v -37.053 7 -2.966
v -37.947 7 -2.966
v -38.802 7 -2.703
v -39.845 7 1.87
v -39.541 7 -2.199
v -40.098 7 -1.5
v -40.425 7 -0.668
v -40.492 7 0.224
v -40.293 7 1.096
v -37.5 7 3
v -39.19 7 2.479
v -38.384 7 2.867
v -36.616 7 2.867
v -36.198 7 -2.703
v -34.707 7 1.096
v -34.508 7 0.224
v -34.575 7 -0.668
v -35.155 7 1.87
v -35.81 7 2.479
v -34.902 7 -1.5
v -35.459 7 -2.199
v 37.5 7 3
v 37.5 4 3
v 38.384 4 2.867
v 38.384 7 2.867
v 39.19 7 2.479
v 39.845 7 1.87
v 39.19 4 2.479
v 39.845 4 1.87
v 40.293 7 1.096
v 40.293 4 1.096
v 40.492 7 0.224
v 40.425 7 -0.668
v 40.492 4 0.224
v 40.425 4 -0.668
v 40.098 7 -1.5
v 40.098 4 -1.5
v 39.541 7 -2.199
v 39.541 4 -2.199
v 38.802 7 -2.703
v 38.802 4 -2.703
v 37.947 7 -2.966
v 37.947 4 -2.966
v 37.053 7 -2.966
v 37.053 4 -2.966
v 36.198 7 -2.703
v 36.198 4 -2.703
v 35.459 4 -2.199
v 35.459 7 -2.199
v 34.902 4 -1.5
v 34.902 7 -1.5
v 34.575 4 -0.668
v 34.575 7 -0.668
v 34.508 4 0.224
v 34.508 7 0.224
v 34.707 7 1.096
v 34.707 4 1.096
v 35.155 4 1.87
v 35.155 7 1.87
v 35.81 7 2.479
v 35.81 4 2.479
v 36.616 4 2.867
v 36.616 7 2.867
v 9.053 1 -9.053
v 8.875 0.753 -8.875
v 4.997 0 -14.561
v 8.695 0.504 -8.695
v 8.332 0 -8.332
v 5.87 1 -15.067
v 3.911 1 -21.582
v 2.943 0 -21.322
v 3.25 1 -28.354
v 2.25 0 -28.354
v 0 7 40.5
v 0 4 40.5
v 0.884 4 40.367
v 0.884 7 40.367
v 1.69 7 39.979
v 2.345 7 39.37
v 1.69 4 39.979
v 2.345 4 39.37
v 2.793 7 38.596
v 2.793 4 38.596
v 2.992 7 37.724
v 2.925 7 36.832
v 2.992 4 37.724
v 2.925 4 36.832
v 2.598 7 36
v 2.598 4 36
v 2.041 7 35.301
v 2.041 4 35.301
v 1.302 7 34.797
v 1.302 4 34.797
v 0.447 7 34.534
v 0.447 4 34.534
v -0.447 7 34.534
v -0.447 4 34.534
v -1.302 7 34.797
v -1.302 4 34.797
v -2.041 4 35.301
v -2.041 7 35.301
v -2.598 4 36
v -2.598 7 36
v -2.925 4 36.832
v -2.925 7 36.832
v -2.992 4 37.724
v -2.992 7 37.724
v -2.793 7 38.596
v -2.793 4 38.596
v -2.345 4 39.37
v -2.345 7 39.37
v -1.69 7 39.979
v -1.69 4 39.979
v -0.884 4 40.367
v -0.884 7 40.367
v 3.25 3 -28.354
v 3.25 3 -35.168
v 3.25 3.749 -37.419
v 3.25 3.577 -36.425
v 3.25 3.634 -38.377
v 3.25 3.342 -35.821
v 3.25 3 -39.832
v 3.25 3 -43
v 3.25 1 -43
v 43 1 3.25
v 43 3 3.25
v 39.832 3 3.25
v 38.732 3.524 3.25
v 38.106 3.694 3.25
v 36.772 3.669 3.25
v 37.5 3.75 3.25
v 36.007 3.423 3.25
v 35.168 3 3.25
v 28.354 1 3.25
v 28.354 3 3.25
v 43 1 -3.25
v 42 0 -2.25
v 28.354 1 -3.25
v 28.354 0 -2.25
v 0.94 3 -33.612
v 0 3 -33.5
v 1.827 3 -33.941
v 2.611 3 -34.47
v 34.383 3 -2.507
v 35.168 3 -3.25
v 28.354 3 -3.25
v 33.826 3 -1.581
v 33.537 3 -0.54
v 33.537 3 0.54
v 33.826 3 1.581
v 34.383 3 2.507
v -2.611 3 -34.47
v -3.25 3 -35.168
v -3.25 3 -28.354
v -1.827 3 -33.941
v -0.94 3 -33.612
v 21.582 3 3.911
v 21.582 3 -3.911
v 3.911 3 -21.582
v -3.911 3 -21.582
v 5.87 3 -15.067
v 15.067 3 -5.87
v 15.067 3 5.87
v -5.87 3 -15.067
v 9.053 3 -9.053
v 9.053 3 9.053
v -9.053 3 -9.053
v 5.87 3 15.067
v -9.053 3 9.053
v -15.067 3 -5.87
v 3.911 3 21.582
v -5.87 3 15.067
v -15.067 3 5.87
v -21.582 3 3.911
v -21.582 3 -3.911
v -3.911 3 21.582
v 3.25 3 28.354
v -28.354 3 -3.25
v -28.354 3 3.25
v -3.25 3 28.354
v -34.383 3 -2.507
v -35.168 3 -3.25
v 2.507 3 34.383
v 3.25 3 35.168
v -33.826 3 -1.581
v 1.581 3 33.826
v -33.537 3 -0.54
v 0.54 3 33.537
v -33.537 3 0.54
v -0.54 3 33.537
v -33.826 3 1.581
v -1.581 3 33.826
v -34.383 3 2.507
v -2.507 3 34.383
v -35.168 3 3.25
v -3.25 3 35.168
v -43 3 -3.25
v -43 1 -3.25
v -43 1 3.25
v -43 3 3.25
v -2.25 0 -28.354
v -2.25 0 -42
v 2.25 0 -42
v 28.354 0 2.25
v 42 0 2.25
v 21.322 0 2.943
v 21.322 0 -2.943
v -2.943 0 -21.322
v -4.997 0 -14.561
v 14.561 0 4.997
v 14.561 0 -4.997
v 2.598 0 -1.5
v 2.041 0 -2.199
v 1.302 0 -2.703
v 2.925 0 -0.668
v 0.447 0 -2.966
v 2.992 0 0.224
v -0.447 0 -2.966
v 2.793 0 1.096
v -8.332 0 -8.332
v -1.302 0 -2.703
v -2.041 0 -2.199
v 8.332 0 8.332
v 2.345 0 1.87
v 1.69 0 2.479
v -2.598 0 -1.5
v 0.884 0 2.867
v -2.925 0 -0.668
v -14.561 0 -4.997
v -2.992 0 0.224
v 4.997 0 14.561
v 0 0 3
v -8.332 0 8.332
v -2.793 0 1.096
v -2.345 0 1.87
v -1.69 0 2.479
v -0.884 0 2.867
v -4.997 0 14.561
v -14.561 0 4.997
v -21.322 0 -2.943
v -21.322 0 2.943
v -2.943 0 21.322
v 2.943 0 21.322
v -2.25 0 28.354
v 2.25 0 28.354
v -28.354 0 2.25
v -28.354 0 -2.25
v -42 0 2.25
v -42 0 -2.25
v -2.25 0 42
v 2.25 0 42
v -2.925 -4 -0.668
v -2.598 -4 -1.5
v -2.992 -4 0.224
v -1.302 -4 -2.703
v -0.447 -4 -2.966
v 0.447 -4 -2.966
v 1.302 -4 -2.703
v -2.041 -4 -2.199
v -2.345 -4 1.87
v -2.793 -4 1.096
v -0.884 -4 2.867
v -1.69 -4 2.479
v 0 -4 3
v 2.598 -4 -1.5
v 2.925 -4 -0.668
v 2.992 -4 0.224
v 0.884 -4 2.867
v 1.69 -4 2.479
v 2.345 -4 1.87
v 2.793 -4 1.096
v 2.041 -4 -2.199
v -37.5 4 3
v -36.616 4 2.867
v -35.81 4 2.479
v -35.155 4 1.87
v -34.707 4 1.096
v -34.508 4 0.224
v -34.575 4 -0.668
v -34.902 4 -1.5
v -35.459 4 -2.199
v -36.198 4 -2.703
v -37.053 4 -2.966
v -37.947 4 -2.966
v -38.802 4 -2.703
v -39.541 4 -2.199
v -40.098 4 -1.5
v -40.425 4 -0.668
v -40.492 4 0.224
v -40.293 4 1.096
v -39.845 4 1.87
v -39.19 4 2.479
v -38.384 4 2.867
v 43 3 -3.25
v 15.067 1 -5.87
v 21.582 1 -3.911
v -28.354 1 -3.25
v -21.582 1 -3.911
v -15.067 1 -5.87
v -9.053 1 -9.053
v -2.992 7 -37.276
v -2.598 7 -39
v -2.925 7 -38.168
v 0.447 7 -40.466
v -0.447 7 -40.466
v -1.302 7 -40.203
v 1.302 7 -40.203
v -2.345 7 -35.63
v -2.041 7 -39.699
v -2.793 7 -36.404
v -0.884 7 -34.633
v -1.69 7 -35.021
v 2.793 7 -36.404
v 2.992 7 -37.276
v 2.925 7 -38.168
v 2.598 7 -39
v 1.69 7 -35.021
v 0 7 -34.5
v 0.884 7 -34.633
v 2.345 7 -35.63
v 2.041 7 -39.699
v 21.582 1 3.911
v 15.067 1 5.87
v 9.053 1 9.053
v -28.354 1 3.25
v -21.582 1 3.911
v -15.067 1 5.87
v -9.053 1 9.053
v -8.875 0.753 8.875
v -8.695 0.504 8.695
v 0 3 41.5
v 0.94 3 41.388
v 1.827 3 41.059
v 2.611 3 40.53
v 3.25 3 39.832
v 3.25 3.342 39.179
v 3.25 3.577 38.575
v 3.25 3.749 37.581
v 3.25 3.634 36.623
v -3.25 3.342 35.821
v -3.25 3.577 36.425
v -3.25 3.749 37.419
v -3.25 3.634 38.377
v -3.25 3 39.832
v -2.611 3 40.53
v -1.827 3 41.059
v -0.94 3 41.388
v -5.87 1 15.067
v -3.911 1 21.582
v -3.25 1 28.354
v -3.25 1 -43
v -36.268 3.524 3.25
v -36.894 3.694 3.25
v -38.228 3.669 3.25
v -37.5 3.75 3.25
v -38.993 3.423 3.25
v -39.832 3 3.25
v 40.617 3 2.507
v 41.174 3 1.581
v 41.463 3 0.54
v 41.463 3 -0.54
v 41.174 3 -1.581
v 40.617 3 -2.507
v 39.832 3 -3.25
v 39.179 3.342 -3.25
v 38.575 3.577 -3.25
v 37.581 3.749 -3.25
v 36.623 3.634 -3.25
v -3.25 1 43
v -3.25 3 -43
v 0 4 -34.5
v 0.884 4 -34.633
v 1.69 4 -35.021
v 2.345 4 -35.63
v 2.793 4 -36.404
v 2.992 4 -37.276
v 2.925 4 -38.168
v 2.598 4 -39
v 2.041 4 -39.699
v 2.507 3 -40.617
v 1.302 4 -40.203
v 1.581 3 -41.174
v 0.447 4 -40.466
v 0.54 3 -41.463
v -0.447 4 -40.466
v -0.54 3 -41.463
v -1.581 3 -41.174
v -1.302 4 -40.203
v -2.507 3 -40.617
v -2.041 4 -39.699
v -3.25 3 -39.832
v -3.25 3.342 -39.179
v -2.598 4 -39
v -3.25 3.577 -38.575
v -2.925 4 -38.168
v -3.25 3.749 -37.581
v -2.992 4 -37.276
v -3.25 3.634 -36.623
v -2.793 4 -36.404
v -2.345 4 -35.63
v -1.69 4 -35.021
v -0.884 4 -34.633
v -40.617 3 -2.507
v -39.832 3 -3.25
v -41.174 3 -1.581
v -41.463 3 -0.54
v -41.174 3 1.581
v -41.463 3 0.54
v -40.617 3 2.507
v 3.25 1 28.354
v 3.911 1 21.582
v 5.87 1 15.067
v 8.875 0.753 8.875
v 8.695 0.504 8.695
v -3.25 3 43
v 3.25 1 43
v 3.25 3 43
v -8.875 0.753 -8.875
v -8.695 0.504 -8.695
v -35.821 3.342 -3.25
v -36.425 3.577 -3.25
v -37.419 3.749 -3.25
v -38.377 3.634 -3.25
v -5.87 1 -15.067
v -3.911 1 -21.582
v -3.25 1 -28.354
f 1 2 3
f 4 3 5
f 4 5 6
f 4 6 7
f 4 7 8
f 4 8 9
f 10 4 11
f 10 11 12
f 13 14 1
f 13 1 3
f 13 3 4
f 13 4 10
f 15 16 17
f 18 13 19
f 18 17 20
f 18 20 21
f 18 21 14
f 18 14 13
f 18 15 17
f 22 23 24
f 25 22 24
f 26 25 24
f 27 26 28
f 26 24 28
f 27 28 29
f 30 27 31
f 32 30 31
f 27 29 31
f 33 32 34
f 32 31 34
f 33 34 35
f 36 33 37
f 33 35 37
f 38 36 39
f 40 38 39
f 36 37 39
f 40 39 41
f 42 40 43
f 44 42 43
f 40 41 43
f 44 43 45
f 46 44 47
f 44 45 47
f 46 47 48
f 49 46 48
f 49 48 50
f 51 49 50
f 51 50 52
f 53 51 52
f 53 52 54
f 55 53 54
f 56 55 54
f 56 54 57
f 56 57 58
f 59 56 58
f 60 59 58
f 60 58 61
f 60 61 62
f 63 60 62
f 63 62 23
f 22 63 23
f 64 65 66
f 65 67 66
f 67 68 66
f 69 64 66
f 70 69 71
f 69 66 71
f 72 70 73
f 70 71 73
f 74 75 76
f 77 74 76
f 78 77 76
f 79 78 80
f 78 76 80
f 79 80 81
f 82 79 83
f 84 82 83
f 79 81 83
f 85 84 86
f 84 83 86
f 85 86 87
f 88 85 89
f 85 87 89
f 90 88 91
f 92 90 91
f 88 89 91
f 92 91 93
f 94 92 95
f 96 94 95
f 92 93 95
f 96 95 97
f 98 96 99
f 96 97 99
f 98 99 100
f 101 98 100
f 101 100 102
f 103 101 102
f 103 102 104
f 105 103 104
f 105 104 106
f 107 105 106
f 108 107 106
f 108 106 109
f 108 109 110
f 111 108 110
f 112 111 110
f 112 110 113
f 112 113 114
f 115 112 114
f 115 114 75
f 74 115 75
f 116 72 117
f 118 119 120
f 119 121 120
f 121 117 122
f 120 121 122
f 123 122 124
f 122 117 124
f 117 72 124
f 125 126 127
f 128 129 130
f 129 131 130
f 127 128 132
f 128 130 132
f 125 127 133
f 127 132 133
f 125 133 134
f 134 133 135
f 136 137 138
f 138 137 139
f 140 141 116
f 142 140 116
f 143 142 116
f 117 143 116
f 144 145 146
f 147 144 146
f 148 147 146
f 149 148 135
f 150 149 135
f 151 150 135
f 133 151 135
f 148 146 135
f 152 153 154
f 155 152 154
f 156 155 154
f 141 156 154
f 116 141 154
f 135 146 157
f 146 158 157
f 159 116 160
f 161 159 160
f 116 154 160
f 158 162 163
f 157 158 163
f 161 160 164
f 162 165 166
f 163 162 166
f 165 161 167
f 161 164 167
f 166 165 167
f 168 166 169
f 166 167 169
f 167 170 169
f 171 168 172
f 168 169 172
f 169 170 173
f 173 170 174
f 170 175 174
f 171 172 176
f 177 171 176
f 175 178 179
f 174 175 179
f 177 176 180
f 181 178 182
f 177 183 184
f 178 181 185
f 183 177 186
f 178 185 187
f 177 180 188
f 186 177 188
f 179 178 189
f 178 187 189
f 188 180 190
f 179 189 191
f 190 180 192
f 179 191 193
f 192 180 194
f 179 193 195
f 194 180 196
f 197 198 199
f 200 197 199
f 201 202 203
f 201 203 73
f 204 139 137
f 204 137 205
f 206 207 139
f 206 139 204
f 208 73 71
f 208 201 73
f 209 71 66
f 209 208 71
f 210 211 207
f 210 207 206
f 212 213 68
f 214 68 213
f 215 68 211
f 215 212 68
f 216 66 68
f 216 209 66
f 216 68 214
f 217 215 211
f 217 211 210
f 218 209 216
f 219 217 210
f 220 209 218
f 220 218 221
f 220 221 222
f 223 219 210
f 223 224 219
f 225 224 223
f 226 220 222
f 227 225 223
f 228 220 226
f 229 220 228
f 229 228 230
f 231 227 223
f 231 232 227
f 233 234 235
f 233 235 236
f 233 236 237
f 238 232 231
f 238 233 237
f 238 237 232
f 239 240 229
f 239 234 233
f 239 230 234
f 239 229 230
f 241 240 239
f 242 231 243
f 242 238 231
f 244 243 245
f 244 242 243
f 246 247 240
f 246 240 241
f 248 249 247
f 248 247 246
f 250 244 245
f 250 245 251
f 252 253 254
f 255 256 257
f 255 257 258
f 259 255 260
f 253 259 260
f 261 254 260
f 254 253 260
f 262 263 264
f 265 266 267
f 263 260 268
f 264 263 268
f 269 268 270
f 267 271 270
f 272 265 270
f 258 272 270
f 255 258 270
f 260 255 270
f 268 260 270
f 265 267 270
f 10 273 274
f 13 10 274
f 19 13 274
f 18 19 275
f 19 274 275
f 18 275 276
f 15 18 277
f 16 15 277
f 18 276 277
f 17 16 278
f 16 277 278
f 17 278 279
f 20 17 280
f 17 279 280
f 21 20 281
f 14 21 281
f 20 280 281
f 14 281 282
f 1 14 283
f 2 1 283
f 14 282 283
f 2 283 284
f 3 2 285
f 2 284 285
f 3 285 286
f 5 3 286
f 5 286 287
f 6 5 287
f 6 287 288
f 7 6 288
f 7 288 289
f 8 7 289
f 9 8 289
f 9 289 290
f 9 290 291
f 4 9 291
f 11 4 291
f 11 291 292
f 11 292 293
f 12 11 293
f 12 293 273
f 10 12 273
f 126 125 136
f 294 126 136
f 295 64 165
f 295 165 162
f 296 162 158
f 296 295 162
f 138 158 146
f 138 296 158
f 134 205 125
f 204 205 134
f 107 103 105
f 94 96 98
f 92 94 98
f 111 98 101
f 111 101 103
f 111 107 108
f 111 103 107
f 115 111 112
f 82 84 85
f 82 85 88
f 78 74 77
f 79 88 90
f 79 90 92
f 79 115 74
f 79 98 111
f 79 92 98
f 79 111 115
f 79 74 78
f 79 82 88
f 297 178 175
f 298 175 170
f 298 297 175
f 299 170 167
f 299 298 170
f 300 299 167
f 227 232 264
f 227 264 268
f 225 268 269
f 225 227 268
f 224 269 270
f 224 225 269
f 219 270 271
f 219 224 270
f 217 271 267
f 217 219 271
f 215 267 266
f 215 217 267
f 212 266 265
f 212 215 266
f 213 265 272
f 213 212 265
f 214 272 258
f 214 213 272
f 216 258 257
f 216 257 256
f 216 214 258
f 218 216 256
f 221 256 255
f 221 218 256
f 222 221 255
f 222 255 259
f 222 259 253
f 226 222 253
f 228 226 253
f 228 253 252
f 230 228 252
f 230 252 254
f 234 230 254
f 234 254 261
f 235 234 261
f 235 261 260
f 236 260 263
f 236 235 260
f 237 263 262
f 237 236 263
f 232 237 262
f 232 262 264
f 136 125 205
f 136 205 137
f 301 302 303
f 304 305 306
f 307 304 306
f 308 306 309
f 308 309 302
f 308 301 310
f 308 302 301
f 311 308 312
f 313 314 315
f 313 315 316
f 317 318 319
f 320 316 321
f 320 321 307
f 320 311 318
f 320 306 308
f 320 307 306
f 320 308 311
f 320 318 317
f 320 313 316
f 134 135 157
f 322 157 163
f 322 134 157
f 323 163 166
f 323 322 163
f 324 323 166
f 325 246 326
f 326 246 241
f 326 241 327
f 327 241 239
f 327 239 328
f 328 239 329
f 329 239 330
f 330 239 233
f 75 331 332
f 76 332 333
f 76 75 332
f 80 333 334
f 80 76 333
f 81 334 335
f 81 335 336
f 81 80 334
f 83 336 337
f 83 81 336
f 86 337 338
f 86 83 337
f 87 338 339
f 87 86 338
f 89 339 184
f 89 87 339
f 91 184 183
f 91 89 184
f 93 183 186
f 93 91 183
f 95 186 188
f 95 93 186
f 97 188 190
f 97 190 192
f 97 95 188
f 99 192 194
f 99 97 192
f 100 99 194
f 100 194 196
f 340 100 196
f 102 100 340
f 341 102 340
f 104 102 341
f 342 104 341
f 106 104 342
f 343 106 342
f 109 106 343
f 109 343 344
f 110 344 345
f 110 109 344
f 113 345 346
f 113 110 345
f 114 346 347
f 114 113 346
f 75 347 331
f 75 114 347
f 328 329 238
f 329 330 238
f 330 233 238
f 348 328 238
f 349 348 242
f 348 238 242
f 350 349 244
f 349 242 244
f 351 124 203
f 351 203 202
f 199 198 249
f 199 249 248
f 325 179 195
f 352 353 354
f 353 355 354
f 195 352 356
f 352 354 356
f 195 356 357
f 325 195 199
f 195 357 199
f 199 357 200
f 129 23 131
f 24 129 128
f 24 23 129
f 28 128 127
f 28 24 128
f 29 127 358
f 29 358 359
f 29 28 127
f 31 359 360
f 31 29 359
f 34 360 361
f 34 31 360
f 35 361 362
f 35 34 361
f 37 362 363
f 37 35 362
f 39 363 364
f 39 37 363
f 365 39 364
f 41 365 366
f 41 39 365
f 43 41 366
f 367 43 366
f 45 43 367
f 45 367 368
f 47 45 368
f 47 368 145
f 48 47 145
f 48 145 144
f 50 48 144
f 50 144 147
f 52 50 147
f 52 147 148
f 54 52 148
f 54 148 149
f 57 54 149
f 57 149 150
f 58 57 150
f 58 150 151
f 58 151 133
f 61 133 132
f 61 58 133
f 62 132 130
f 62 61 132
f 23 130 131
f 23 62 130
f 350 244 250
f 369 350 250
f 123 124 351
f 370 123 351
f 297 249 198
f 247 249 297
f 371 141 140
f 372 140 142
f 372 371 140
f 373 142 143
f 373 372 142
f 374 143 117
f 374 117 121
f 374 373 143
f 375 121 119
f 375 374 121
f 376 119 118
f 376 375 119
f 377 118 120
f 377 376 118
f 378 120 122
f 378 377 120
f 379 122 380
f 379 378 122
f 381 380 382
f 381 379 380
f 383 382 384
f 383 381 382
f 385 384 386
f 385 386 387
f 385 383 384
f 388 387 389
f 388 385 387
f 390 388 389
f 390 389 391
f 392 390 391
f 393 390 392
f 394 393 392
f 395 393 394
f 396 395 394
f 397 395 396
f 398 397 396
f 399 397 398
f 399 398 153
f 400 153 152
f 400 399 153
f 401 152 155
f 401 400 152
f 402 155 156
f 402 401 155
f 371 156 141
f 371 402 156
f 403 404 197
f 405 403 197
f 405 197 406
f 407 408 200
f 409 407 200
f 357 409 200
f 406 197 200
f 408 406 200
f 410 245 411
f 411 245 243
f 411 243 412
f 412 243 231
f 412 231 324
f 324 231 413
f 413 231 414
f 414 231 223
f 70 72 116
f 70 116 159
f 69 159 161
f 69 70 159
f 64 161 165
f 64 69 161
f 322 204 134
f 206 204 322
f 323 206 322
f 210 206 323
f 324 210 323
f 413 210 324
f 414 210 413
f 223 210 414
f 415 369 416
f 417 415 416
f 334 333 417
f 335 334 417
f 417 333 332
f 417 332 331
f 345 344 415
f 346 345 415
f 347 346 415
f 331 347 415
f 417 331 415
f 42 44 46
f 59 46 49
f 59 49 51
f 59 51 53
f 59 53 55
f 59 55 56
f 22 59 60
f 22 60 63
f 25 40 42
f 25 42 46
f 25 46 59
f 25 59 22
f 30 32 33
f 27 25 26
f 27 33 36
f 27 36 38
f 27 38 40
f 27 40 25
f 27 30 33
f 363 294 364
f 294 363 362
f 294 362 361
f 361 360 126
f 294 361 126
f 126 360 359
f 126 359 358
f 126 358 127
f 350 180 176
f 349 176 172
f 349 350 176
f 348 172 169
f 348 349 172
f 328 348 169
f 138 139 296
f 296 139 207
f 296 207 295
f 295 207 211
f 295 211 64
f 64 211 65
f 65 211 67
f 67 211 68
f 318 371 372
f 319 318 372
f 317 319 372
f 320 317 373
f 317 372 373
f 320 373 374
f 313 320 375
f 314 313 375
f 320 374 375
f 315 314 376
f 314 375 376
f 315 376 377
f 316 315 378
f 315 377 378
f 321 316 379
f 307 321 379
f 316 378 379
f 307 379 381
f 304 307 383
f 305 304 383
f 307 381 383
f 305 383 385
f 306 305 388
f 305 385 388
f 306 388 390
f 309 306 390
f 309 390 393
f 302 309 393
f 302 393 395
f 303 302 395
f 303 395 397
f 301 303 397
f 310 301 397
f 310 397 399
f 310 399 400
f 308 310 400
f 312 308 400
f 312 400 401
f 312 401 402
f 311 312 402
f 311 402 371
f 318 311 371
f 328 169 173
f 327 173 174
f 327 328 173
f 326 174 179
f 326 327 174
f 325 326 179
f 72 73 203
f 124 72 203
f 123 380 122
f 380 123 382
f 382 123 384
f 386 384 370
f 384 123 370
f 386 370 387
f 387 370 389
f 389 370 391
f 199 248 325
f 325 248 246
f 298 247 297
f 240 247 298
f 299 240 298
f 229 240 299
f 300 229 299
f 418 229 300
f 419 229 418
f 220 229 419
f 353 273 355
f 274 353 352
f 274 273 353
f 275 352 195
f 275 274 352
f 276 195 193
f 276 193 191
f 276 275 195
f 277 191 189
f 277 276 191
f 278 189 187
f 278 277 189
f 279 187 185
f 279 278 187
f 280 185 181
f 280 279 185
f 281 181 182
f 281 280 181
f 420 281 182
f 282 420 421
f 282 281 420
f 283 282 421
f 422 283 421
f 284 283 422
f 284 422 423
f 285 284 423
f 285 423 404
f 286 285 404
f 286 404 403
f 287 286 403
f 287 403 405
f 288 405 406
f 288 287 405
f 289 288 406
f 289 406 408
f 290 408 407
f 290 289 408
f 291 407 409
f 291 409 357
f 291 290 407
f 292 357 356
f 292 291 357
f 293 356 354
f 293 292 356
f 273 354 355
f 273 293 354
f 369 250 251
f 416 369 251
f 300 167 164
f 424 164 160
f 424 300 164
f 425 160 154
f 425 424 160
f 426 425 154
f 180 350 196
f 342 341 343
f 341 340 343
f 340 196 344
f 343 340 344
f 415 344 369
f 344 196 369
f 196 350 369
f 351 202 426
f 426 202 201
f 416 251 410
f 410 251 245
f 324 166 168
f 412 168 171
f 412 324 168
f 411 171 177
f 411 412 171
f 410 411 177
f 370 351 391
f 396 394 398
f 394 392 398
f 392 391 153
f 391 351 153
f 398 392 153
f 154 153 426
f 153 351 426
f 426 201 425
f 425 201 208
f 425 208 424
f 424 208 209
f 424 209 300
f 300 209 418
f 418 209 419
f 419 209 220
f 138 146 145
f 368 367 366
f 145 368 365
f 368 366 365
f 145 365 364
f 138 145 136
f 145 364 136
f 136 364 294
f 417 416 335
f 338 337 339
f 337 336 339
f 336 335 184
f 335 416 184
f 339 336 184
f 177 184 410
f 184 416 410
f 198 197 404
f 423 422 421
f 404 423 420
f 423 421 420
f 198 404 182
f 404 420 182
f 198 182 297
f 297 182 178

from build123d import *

# Parameters (mm, degrees)
SKETCH1_R           = 3
BOSS_EXTRUDE1_DEPTH = 4
BOSS_EXTRUDE2_DEPTH = 3
SKETCH3_R           = 3
BOSS_EXTRUDE3_DEPTH = 4
FILLET2_R           = 35
CHAMFER1_SIZE       = 1
CHAMFER2_SIZE       = 1


with BuildPart() as part:
    # Sketch1 → Boss-Extrude1 (new body)
    with BuildSketch(Plane(origin=(0, 0, 0), x_dir=(1, 0, 0), z_dir=(0, 1, 0))):
        with Locations(Location((0, 0, 0), (0, 0, 270))):
            Circle(SKETCH1_R)
    extrude(amount=-BOSS_EXTRUDE1_DEPTH)

    # Sketch2 → Boss-Extrude2 (add)
    with BuildSketch(Plane(origin=(0, 0, 0), x_dir=(1, 0, 0), z_dir=(0, 1, 0))):
        Polygon((-3.25, 43), (-3.25, 13.856601718), (-13.856601718, 3.25), (-43, 3.25), (-43, -3.25), (-13.856601718, -3.25), (-3.25, -13.856601718), (-3.25, -43), (3.25, -43), (3.25, -13.856601718), (13.856601718, -3.25), (43, -3.25), (43, 3.25), (13.856601718, 3.25), (3.25, 13.856601718), (3.25, 43), align=None)
    extrude(amount=BOSS_EXTRUDE2_DEPTH)

    # Sketch3 → Boss-Extrude3 (add)
    with BuildSketch(Plane(origin=(0, 3, 0), x_dir=(1, 0, 0), z_dir=(0, 1, 0))):
        with Locations(Location((-37.5, 0, 0), (0, 0, 270))):
            Circle(SKETCH3_R)
        with Locations(Location((0, 37.5, 0), (0, 0, 270))):
            Circle(SKETCH3_R)
        with Locations(Location((37.5, 0, 0), (0, 0, 270))):
            Circle(SKETCH3_R)
        with Locations(Location((0, -37.5, 0), (0, 0, 270))):
            Circle(SKETCH3_R)
    extrude(amount=BOSS_EXTRUDE3_DEPTH)

    # Fillet2
    # the kernel refuses this fillet: 35 mm, written as the material it adds along each edge
    with BuildSketch(Plane(origin=(-13.856601718, 0, -3.25), x_dir=(0.7071067811865472, 0, -0.7071067811865478), z_dir=(0, 1, 0)), Plane(origin=(-3.25, 0, -13.856601718), x_dir=(0, 0, -1), z_dir=(0, 1, 0)), Plane(origin=(-13.856601718, 0, 3.25), x_dir=(-1, 0, 0), z_dir=(0, 1, 0)), Plane(origin=(-3.25, 0, 13.856601718), x_dir=(-0.7071067811865476, 0, -0.7071067811865475), z_dir=(0, 1, 0))) as fillet2_piece_1:
        with BuildLine():
            CenterArc((FILLET2_R * 0.414213562373, FILLET2_R), FILLET2_R, 225, 45)
            Line((-FILLET2_R * 0.292893218813, FILLET2_R * 0.292893218813), (0, 0))
            Line((0, 0), (FILLET2_R * 0.414213562373, 0))
        make_face()
    extrude(amount=3)
    with BuildSketch(Plane(origin=(3.25, 0, -13.856601718), x_dir=(0, 0, -1), z_dir=(0, 1, 0)), Plane(origin=(13.856601718, 0, -3.25), x_dir=(-0.7071067811865475, 0, -0.7071067811865476), z_dir=(0, 1, 0)), Plane(origin=(13.856601718, 0, 3.25), x_dir=(1, 0, 0), z_dir=(0, 1, 0)), Plane(origin=(3.25, 0, 13.856601718), x_dir=(0.7071067811865477, 0, -0.7071067811865474), z_dir=(0, 1, 0))) as fillet2_piece_2:
        with BuildLine():
            CenterArc((FILLET2_R * 0.414213562373, -FILLET2_R), FILLET2_R, 90, 45)
            Line((-FILLET2_R * 0.292893218813, -FILLET2_R * 0.292893218813), (0, 0))
            Line((0, 0), (FILLET2_R * 0.414213562373, 0))
        make_face()
    extrude(amount=3)

    # Chamfer1
    # the kernel refuses this chamfer: 1 mm, written as the material it adds along each edge
    with BuildSketch(Plane(origin=(-37.5, 3, 0), x_dir=(0, 0, 1), z_dir=(-1, 0, 0))) as chamfer1_piece_1_section:
        Polygon((3 + CHAMFER1_SIZE, 0), (3, CHAMFER1_SIZE), (3, 0), align=None)
    chamfer1_piece_1 = revolve(axis=Axis((-37.5, 3, 0), (0, 1, 0)), mode=Mode.PRIVATE)
    chamfer1_piece_1 = split(chamfer1_piece_1, bisect_by=Plane(origin=(-34.177083345, 3.132594622, 3.25), z_dir=(0, 0, -1)), keep=Keep.TOP, mode=Mode.PRIVATE)
    chamfer1_piece_1 = split(chamfer1_piece_1, bisect_by=Plane(origin=(-34.177083345, 3.132594622, -3.25), z_dir=(0, 0, 1)), keep=Keep.TOP, mode=Mode.PRIVATE)
    add(chamfer1_piece_1)
    with BuildSketch(Plane(origin=(0, 3, -37.5), x_dir=(0, 0, 1), z_dir=(-1, 0, 0))) as chamfer1_piece_2_section:
        Polygon((3 + CHAMFER1_SIZE, 0), (3, CHAMFER1_SIZE), (3, 0), align=None)
    chamfer1_piece_2 = revolve(axis=Axis((0, 3, -37.5), (0, 1, 0)), mode=Mode.PRIVATE)
    chamfer1_piece_2 = split(chamfer1_piece_2, bisect_by=Plane(origin=(-3.25, 3.484784137, -40.984784137), z_dir=(1, 0, 0)), keep=Keep.TOP, mode=Mode.PRIVATE)
    chamfer1_piece_2 = split(chamfer1_piece_2, bisect_by=Plane(origin=(3.25, 3.484784137, -40.984784137), z_dir=(-1, 0, 0)), keep=Keep.TOP, mode=Mode.PRIVATE)
    add(chamfer1_piece_2)
    with BuildSketch(Plane(origin=(37.5, 3, 0), x_dir=(0, 0, 1), z_dir=(-1, 0, 0))) as chamfer1_piece_3_section:
        Polygon((3 + CHAMFER1_SIZE, 0), (3, CHAMFER1_SIZE), (3, 0), align=None)
    chamfer1_piece_3 = revolve(axis=Axis((37.5, 3, 0), (0, 1, 0)), mode=Mode.PRIVATE)
    chamfer1_piece_3 = split(chamfer1_piece_3, bisect_by=Plane(origin=(40.822916655, 3.132594622, -3.25), z_dir=(0, 0, 1)), keep=Keep.TOP, mode=Mode.PRIVATE)
    chamfer1_piece_3 = split(chamfer1_piece_3, bisect_by=Plane(origin=(40.822916655, 3.132594622, 3.25), z_dir=(0, 0, -1)), keep=Keep.TOP, mode=Mode.PRIVATE)
    add(chamfer1_piece_3)
    with BuildSketch(Plane(origin=(0, 3, 37.5), x_dir=(0, 0, 1), z_dir=(-1, 0, 0))) as chamfer1_piece_4_section:
        Polygon((3 + CHAMFER1_SIZE, 0), (3, CHAMFER1_SIZE), (3, 0), align=None)
    chamfer1_piece_4 = revolve(axis=Axis((0, 3, 37.5), (0, 1, 0)), mode=Mode.PRIVATE)
    chamfer1_piece_4 = split(chamfer1_piece_4, bisect_by=Plane(origin=(3.25, 3.484784137, 34.015215863), z_dir=(-1, 0, 0)), keep=Keep.TOP, mode=Mode.PRIVATE)
    chamfer1_piece_4 = split(chamfer1_piece_4, bisect_by=Plane(origin=(-3.25, 3.484784137, 34.015215863), z_dir=(1, 0, 0)), keep=Keep.TOP, mode=Mode.PRIVATE)
    add(chamfer1_piece_4)

    # Chamfer2
    chamfer2_edges = [part.edges().sort_by_distance(p)[0] for p in [
        (-3.25, 0, 35.6770382),
        (3.25, 0, 35.6770382),
        (0, 0, 43),
        (3.25, 0, -35.6770382),
        (-3.25, 0, -35.6770382),
        (-4.732121832, 0, -18.276782958),
        (-18.276782958, 0, -4.732121832),
        (-35.6770382, 0, -3.25),
        (-35.6770382, 0, 3.25),
        (-18.276782958, 0, 4.732121832),
        (-4.732121832, 0, 18.276782958),
        (4.732121832, 0, 18.276782958),
        (18.276782958, 0, 4.732121832),
        (35.6770382, 0, 3.25),
        (35.6770382, 0, -3.25),
        (18.276782958, 0, -4.732121832),
        (4.732121832, 0, -18.276782958),
        (43, 0, 0),
        (-43, 0, 0),
        (0, 0, -43),
    ]]
    chamfer(chamfer2_edges, length=CHAMFER2_SIZE)


solid = part.part
